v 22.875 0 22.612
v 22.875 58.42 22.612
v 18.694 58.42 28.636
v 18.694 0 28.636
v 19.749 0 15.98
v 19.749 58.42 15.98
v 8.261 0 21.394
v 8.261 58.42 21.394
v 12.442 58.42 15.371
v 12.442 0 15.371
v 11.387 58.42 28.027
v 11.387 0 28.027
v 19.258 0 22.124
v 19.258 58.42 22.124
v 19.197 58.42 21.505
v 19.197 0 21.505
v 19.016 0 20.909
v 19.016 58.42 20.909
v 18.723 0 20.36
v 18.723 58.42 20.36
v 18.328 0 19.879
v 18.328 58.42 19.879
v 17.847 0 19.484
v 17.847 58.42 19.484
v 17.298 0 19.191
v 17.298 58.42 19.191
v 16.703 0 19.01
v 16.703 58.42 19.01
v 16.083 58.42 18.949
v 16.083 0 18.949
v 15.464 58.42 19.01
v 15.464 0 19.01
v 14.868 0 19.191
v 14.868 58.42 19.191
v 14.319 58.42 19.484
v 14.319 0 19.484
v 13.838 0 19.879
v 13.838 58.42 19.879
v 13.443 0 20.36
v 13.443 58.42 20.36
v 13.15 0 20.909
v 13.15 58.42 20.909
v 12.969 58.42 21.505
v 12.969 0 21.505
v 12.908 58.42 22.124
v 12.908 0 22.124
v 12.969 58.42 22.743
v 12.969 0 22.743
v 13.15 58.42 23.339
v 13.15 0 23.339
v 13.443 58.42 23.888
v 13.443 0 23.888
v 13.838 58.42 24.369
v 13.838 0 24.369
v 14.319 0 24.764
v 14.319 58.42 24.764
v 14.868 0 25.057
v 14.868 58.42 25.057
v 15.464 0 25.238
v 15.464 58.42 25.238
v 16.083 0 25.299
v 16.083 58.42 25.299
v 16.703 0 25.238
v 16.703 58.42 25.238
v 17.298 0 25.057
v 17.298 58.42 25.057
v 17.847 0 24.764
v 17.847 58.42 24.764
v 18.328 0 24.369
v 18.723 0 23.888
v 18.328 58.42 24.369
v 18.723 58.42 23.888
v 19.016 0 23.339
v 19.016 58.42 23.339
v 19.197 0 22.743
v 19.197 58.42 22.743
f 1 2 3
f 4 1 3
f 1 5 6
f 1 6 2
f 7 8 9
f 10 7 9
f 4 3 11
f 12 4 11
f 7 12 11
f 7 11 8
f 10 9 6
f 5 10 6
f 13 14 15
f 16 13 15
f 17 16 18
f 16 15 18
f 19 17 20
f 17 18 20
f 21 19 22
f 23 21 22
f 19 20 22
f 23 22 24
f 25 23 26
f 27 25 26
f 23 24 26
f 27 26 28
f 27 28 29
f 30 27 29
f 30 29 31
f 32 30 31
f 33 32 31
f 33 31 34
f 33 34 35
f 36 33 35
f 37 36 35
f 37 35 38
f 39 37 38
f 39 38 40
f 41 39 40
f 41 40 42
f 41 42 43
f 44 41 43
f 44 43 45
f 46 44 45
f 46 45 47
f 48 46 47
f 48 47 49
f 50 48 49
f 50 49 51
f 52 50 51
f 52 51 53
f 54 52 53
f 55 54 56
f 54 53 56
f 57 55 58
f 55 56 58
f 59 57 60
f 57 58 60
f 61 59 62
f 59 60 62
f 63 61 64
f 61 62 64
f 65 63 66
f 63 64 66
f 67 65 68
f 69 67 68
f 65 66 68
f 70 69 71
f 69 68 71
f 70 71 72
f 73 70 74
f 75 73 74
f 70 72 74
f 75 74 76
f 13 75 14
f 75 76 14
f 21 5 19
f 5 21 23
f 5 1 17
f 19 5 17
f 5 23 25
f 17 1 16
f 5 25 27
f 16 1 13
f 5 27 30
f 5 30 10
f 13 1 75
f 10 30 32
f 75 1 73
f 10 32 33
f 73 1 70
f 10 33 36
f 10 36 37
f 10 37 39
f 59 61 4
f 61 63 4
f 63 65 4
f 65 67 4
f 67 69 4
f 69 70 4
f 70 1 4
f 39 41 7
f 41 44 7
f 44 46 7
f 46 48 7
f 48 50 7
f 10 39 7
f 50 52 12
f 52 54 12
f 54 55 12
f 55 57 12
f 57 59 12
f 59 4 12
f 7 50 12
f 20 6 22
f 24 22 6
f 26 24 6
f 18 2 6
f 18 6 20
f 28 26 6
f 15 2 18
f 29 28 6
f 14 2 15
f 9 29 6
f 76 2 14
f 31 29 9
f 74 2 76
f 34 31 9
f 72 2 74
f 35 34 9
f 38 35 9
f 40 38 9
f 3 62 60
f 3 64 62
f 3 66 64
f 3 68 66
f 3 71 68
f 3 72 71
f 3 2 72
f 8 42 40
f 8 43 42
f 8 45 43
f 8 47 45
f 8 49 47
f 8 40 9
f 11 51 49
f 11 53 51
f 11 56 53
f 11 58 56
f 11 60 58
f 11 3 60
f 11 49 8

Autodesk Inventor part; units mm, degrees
ref_plane "YZ Plane" through (0, 0, 0) normal (1, 0, 0) x (0, 1, 0)
ref_plane "XZ Plane" through (0, 0, 0) normal (0, 1, 0) x (-1, 0, 0)
ref_plane "XY Plane" through (0, 0, 0) normal (0, 0, 1) x (1, 0, 0)
sketch "Sketch1" plane through (0, 0, 0) normal (0, 1, 0) x (-1, 0, 0)
  line L0 (-8.2612, 21.3942) -> (-12.4421, 15.3706)
  line L1 (-12.4421, 15.3706) -> (-19.7491, 15.9795)
  line L2 (-19.7491, 15.9795) -> (-22.8753, 22.612)
  line L3 (-22.8753, 22.612) -> (-18.6944, 28.6356)
  line L4 (-18.6944, 28.6356) -> (-11.3874, 28.0267)
  line L5 (-11.3874, 28.0267) -> (-8.2612, 21.3942)
  point P0 (0, 0)
  point P1 (-15.5682, 22.0031)
  dimension "d0" = 12.7
extrude "Extrusion1" add sketch "Sketch1" along normal blind 58.42
sketch "Sketch4" plane through (0, 58.42, 0) normal (0, 1, 0) x (1, 0, 0)
  circle A0 centre (16.0831, -22.124) radius 3.175
  point P0 (0, 0)
  dimension "d4" = 6.35
extrude "Extrusion2" cut sketch "Sketch4" against normal through all
properties part number "Hex Shaft"
